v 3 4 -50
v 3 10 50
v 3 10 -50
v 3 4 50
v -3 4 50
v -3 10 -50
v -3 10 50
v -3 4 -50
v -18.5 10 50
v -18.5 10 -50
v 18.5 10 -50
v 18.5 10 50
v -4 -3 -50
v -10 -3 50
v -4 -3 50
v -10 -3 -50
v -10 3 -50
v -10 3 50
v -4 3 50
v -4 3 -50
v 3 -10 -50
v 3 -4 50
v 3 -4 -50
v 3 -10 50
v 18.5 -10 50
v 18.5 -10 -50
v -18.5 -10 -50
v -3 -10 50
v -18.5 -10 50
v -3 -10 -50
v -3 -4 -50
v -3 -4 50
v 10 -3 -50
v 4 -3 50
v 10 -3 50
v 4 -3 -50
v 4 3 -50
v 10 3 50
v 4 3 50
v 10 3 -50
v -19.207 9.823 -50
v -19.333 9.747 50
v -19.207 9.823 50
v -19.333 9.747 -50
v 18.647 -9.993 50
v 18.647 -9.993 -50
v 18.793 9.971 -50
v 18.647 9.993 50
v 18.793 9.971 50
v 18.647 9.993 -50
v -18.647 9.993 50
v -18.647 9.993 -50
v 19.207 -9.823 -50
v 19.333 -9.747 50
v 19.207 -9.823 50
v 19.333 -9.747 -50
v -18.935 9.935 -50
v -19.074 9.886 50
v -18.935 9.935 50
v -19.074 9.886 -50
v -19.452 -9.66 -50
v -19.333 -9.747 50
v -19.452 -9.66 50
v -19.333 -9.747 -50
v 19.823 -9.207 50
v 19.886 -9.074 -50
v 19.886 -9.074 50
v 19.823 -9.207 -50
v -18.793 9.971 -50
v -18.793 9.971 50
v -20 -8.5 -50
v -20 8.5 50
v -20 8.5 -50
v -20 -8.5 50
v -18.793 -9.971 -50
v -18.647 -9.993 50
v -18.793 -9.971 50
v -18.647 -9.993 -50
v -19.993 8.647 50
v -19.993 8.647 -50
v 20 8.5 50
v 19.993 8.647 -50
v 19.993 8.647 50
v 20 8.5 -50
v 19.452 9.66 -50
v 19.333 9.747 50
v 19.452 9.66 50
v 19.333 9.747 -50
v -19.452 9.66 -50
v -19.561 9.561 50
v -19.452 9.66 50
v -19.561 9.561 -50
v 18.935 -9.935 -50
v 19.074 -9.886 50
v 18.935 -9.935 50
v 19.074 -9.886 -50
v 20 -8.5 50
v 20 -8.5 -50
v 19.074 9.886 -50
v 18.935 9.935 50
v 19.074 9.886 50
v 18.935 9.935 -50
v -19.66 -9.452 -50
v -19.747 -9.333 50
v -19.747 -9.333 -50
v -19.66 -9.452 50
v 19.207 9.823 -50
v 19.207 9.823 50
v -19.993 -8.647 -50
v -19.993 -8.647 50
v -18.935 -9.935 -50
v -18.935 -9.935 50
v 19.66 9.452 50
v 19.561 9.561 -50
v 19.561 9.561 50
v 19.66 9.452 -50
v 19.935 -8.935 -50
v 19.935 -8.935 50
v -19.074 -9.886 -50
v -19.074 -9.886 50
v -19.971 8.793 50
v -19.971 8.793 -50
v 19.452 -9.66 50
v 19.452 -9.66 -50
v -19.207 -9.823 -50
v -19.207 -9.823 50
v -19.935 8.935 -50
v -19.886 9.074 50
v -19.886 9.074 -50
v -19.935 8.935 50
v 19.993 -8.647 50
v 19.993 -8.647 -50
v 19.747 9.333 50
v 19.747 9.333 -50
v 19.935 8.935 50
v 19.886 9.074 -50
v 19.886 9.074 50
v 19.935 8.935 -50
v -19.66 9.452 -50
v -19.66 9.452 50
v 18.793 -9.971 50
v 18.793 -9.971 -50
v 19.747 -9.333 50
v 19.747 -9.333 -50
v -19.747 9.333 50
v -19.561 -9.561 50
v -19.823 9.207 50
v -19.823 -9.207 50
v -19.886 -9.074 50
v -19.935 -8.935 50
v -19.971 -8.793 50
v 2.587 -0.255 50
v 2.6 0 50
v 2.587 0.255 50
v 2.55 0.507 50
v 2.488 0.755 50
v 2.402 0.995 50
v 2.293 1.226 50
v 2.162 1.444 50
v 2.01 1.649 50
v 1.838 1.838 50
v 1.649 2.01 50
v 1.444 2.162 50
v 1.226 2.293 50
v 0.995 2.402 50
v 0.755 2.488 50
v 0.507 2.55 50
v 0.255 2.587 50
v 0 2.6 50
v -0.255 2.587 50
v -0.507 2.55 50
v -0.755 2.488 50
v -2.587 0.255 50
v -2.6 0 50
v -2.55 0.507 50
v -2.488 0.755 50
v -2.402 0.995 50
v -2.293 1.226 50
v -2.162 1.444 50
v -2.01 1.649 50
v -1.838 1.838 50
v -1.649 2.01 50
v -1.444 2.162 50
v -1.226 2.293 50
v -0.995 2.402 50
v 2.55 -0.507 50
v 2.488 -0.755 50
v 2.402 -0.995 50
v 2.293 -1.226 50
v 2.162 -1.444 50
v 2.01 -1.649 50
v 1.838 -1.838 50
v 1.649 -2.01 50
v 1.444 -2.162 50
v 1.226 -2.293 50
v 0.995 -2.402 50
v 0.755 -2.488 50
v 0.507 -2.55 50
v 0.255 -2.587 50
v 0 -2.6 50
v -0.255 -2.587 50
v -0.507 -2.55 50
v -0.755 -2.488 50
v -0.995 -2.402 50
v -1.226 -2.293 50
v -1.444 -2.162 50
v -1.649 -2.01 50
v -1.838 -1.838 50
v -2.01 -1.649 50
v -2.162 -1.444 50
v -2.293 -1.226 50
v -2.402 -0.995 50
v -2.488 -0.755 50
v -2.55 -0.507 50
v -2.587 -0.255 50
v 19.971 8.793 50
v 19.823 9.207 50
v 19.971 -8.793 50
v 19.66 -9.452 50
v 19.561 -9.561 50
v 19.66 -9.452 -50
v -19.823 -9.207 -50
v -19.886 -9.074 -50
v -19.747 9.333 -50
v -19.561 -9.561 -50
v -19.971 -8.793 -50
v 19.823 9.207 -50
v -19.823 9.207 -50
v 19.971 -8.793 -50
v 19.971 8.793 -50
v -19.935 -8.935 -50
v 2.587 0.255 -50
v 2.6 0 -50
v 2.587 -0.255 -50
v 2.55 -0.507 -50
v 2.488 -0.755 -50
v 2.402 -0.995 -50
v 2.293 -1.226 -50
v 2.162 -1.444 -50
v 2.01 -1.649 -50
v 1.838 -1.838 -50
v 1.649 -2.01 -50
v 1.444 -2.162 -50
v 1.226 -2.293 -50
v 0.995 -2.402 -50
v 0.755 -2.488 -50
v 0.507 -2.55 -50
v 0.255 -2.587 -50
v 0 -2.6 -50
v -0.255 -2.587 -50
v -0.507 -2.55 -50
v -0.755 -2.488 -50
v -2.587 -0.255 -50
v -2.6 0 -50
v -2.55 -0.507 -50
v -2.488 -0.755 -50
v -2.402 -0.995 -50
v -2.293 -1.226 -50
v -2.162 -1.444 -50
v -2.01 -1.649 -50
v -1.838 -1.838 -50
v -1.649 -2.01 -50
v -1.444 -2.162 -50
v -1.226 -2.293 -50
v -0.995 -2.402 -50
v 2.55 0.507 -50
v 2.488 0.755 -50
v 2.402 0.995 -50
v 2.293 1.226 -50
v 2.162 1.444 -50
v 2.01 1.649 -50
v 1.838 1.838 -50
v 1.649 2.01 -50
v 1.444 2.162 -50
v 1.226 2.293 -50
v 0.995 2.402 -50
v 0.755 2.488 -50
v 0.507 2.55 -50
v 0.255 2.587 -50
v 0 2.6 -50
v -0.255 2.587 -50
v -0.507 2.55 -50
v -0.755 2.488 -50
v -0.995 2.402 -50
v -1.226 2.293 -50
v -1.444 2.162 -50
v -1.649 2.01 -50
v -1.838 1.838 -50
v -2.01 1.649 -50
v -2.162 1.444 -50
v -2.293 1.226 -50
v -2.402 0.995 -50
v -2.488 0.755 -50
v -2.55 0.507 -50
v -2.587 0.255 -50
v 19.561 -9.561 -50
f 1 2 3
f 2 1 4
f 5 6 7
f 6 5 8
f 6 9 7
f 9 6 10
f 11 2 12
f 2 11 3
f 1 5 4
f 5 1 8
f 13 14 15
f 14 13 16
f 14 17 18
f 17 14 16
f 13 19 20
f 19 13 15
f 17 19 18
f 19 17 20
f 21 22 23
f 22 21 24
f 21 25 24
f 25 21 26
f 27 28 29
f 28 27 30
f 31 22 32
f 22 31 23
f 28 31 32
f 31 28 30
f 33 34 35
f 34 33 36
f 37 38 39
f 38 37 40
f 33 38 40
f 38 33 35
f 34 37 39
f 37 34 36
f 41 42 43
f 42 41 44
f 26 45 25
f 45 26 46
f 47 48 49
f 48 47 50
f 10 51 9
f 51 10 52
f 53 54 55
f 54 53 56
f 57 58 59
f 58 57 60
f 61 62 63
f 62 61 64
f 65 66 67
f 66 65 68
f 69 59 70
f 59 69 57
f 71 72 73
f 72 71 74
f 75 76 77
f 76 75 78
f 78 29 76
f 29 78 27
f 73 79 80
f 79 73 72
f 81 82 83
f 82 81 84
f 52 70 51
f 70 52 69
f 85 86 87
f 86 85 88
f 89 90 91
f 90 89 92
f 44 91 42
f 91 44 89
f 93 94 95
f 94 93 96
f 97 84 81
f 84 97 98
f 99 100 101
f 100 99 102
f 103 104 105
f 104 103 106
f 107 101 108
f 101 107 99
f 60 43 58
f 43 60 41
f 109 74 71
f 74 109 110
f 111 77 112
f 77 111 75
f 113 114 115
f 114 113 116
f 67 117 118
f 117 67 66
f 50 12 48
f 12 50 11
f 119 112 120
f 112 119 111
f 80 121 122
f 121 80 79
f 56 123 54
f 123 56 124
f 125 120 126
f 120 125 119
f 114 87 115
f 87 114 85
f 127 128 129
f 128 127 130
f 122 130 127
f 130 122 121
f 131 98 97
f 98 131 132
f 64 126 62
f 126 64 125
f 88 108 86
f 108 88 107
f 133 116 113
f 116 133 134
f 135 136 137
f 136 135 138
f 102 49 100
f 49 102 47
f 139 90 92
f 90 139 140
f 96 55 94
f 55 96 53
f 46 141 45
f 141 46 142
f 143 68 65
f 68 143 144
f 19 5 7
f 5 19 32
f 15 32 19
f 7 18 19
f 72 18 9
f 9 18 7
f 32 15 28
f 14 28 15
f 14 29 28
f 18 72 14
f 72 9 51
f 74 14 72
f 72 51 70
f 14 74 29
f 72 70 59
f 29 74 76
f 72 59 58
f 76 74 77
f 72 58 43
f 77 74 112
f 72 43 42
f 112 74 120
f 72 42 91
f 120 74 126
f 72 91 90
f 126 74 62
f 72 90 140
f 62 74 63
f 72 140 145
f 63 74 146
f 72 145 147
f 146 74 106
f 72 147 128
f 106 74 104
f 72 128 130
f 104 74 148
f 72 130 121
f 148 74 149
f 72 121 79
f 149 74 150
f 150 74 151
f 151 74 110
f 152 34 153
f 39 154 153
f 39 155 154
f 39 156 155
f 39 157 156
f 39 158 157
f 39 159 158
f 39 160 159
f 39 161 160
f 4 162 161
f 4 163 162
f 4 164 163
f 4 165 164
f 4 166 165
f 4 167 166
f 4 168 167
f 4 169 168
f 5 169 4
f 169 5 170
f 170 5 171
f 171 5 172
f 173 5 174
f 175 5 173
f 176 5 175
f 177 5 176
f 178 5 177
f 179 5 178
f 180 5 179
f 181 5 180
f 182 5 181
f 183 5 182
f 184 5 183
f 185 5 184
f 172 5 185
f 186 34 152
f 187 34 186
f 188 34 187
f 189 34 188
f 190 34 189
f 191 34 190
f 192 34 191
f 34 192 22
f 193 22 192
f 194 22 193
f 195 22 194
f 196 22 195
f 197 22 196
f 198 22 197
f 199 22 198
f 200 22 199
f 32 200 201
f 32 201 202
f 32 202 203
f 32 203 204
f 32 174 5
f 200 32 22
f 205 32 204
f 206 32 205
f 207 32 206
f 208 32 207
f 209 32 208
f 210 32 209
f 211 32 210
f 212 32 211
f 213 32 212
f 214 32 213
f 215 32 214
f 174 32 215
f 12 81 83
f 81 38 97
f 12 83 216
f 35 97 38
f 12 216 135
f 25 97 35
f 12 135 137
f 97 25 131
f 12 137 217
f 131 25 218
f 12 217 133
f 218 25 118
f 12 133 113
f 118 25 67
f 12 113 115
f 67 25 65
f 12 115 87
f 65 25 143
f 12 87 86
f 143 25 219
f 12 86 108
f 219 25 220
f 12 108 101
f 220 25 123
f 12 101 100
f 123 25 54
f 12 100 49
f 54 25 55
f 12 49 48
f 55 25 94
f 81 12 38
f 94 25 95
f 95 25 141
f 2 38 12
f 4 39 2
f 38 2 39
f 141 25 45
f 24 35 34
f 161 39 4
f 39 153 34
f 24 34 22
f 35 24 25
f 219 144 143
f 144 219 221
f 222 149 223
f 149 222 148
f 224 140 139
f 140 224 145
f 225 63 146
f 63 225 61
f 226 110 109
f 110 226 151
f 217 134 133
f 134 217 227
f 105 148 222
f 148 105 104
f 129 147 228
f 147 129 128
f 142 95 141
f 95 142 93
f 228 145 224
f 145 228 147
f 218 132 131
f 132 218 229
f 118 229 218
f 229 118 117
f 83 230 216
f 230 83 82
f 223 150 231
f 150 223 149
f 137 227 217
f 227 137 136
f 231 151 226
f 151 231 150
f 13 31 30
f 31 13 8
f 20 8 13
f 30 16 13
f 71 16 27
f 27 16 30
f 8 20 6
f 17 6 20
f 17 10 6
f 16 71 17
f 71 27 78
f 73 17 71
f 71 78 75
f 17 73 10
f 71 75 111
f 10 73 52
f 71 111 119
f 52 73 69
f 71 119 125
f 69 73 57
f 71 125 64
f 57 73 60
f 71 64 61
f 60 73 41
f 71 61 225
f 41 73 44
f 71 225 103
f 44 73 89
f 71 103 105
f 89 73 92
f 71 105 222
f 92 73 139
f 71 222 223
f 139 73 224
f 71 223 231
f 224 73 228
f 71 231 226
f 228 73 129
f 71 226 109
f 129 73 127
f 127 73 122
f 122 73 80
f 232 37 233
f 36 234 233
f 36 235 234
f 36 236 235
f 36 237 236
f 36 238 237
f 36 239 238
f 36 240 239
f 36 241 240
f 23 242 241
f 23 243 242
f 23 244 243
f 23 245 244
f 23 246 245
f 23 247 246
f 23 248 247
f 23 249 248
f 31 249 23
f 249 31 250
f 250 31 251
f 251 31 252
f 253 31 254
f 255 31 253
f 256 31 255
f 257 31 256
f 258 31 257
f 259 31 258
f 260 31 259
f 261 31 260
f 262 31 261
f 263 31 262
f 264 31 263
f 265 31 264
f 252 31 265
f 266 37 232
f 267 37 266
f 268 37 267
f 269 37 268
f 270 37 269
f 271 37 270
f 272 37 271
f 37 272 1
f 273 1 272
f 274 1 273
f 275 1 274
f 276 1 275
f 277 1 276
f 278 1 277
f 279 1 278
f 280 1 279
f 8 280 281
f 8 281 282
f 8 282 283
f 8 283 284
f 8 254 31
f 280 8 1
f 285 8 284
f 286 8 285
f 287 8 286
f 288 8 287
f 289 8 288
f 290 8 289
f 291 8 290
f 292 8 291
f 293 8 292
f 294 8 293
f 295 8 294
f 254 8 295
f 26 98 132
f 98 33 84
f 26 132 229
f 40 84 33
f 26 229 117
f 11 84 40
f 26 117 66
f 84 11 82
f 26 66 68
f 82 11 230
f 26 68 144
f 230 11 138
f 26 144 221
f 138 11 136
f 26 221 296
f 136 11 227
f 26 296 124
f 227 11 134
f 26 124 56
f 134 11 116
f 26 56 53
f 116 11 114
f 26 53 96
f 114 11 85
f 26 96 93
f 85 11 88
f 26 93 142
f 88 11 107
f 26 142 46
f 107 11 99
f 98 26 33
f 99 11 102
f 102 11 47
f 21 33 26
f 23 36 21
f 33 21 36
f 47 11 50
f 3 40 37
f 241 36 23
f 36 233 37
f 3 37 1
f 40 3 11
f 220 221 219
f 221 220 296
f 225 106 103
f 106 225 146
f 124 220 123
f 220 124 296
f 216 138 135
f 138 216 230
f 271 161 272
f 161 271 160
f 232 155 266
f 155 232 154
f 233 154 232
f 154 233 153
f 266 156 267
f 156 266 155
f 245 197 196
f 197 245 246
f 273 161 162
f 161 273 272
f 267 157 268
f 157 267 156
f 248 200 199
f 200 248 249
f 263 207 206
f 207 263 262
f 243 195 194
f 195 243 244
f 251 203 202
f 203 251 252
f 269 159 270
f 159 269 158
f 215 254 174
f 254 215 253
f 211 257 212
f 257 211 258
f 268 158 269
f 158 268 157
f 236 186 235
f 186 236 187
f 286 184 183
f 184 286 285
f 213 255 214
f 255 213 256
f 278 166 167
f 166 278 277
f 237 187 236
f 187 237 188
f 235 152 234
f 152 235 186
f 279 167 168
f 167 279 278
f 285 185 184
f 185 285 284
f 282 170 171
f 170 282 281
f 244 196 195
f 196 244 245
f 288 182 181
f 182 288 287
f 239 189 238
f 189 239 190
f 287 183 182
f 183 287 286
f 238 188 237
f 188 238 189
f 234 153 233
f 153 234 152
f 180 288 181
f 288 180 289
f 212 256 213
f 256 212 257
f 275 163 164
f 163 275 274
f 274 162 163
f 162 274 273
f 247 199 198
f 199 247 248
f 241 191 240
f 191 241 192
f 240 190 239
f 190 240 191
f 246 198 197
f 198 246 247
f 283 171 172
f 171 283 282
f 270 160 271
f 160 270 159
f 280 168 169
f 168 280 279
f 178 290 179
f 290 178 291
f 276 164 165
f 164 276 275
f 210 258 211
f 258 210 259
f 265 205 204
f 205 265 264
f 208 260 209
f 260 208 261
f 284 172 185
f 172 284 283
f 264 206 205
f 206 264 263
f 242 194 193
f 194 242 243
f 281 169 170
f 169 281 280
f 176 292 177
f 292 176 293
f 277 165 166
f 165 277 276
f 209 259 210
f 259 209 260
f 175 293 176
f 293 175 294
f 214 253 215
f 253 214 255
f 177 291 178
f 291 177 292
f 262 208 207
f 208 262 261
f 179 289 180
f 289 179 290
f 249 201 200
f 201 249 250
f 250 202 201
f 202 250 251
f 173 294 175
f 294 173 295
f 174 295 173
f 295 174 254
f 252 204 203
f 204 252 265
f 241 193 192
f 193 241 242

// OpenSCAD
$fn=64;

module tslot_2040_profile(length=100, w=40, h=20, corner_r=1.5, slot_w=6, slot_d=6, center_hole_d=5.2) {
    difference() {
        linear_extrude(height=length, center=true, convexity=10)
            offset(r=corner_r)
                square([w-2*corner_r, h-2*corner_r], center=true);

        // Center bore
        cylinder(h=length+2, d=center_hole_d, center=true);

        // T-slots (approximate) on all four faces
        for (rot = [0, 90, 180, 270]) {
            rotate([0,0,rot]) {
                // Slot on +Y face
                translate([0, h/2 - slot_d/2, 0])
                    cube([slot_w, slot_d, length+2], center=true);
            }
        }
    }
}

tslot_2040_profile(100, 40, 20, 1.5, 6, 6, 5.2);
